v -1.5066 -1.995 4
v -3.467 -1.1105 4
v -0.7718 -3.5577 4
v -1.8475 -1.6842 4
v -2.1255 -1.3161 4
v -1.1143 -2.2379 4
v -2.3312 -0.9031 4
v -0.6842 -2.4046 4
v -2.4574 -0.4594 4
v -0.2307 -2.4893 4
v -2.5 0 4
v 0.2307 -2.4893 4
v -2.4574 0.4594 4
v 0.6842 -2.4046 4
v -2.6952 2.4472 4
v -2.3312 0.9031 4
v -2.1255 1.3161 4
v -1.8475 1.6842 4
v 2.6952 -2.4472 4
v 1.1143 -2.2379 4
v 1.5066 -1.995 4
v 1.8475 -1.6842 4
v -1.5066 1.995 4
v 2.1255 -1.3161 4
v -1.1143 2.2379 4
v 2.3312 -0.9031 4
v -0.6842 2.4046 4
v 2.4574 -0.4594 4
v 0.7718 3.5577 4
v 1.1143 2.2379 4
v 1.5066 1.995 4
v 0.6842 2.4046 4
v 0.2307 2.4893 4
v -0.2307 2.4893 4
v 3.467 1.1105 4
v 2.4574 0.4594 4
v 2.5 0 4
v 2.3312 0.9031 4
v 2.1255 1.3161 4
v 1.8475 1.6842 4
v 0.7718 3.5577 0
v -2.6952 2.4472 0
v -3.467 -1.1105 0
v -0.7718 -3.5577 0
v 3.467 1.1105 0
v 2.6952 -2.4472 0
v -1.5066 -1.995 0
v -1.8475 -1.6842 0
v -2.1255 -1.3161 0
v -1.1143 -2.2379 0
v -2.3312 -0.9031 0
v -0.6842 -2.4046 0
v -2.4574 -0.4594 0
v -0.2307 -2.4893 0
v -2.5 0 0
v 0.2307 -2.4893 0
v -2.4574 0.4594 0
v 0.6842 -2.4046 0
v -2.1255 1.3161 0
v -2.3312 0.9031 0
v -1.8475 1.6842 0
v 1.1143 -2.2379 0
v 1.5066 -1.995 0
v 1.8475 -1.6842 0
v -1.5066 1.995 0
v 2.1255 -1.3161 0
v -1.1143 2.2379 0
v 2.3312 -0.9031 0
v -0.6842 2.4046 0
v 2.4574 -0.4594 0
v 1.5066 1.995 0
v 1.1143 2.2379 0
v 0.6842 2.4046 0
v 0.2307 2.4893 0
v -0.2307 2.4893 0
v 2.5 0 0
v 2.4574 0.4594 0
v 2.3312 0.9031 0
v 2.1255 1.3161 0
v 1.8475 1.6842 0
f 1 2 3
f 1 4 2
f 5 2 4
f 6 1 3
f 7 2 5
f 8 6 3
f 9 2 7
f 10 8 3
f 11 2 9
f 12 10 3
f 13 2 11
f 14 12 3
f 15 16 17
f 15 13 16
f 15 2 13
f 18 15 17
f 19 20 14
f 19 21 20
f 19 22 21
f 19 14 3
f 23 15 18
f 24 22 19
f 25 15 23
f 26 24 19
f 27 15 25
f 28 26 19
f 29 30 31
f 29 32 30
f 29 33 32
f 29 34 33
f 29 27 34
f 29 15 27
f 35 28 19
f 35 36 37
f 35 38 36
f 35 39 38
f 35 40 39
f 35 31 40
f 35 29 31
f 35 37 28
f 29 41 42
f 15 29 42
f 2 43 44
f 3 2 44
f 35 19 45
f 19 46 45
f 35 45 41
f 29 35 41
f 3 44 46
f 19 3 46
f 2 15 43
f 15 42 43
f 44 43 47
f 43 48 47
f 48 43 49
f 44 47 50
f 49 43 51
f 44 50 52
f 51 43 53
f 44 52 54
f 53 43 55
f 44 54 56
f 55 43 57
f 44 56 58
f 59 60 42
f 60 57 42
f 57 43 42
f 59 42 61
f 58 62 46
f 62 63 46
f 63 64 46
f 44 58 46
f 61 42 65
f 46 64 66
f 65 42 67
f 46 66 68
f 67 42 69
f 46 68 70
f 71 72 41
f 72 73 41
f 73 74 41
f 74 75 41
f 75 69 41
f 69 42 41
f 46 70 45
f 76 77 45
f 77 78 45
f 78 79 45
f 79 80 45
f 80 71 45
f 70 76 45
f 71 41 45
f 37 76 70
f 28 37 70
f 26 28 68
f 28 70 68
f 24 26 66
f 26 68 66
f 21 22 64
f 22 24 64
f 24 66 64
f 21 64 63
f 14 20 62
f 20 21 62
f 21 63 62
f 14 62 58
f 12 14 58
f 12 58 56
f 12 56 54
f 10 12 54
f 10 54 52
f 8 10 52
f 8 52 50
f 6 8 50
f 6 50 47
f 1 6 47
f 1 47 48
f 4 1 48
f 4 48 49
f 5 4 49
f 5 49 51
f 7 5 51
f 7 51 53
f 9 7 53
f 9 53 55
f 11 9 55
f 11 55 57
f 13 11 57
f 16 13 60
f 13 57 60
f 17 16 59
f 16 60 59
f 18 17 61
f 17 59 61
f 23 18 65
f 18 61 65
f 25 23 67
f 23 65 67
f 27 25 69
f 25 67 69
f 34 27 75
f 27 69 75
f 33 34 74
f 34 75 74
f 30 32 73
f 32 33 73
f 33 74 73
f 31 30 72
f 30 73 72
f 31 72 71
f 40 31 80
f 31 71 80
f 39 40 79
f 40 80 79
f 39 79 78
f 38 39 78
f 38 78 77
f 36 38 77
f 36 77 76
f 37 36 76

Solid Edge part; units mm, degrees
sketch "Sketch1" plane through (0, 0, 0) normal (0, 0, 1) x (1, 0, 0)
  line L0 (2.6952, -2.4472) -> (3.467, 1.1105)
  line L1 (3.467, 1.1105) -> (0.7718, 3.5577)
  line L2 (0.7718, 3.5577) -> (-2.6952, 2.4472)
  line L3 (-2.6952, 2.4472) -> (-3.467, -1.1105)
  line L4 (-3.467, -1.1105) -> (-0.7718, -3.5577)
  line L5 (-0.7718, -3.5577) -> (2.6952, -2.4472)
extrude "Protrusion1" add sketch "Sketch1" along normal blind 4
sketch "Sketch2" plane through (0, 0, 0) normal (0, 0, 1) x (1, 0, 0)
  circle A0 centre (0, 0) radius 2.5
extrude "ExtrudedCutout_1" cut sketch "Sketch2" along normal blind 4
